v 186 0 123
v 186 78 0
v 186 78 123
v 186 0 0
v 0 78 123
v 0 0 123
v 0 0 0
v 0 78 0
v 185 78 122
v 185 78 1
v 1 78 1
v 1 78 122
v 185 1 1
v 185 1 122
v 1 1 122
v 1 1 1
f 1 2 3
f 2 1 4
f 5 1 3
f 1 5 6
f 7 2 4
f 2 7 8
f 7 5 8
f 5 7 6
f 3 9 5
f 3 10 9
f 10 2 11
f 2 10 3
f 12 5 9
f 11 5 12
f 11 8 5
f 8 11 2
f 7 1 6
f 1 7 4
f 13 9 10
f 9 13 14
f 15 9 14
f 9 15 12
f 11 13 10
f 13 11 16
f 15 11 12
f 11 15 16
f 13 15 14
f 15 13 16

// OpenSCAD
// file: camera.scad
module camera(longlens=false) {

    translate([0, -17, 0]) {
        cube([40, 17, 67]);
    }
    translate([88, 27, 51]) {
        cube([36, 10, 20]);
    }

    // tripod screw thread
    difference() {
        cube([120, 27, 67]); // <--
        translate([78, 15, -1]) {
            cylinder(h = 5, d = 8);
        }
    }
    translate([78, 15, 3]) {
        color([1, 0, 0]) cylinder(h = 1, d = 8);
    }
    
    // knobs
    translate([20, 15, 67]) {
        cylinder(h = 1.5, d = 14);
    }
    translate([40, 15, 67]) {
        cylinder(h = 1.5, d = 14);
    }
    
    // belt attachment holder
    translate([-6, 20, 54]) {
        cube([6, 1, 6]);
    }
    translate([120, 20, 54]) {
        cube([6, 1, 6]);
    }

    // lens mount and lens
    translate([78, 0, 32]) {
        rotate([90]) {
            color([1,0,0]) cylinder(h = 5, d = 60);
            
            // lens

            if (longlens) {
                translate([0, 0, 5]) {
                    cylinder(h = 63, d = 73);
                }
            } else {
                translate([0, 0, 5]) {
                    cylinder(h = 23, d = 62);
                }
            }
        }
    }
    
    // port door
    translate([120, 8, 9]) cube([9, 1, 27]);
}
// main file
include <camera.scad>;

translate([]) {
    difference() {
        cube([184+2, 78, 121+2]);
        translate([1, 1, 1]) cube([184, 78, 121]);
    }
}

%translate([20, 25, 30]) color("blue") %camera(longlens=true);
